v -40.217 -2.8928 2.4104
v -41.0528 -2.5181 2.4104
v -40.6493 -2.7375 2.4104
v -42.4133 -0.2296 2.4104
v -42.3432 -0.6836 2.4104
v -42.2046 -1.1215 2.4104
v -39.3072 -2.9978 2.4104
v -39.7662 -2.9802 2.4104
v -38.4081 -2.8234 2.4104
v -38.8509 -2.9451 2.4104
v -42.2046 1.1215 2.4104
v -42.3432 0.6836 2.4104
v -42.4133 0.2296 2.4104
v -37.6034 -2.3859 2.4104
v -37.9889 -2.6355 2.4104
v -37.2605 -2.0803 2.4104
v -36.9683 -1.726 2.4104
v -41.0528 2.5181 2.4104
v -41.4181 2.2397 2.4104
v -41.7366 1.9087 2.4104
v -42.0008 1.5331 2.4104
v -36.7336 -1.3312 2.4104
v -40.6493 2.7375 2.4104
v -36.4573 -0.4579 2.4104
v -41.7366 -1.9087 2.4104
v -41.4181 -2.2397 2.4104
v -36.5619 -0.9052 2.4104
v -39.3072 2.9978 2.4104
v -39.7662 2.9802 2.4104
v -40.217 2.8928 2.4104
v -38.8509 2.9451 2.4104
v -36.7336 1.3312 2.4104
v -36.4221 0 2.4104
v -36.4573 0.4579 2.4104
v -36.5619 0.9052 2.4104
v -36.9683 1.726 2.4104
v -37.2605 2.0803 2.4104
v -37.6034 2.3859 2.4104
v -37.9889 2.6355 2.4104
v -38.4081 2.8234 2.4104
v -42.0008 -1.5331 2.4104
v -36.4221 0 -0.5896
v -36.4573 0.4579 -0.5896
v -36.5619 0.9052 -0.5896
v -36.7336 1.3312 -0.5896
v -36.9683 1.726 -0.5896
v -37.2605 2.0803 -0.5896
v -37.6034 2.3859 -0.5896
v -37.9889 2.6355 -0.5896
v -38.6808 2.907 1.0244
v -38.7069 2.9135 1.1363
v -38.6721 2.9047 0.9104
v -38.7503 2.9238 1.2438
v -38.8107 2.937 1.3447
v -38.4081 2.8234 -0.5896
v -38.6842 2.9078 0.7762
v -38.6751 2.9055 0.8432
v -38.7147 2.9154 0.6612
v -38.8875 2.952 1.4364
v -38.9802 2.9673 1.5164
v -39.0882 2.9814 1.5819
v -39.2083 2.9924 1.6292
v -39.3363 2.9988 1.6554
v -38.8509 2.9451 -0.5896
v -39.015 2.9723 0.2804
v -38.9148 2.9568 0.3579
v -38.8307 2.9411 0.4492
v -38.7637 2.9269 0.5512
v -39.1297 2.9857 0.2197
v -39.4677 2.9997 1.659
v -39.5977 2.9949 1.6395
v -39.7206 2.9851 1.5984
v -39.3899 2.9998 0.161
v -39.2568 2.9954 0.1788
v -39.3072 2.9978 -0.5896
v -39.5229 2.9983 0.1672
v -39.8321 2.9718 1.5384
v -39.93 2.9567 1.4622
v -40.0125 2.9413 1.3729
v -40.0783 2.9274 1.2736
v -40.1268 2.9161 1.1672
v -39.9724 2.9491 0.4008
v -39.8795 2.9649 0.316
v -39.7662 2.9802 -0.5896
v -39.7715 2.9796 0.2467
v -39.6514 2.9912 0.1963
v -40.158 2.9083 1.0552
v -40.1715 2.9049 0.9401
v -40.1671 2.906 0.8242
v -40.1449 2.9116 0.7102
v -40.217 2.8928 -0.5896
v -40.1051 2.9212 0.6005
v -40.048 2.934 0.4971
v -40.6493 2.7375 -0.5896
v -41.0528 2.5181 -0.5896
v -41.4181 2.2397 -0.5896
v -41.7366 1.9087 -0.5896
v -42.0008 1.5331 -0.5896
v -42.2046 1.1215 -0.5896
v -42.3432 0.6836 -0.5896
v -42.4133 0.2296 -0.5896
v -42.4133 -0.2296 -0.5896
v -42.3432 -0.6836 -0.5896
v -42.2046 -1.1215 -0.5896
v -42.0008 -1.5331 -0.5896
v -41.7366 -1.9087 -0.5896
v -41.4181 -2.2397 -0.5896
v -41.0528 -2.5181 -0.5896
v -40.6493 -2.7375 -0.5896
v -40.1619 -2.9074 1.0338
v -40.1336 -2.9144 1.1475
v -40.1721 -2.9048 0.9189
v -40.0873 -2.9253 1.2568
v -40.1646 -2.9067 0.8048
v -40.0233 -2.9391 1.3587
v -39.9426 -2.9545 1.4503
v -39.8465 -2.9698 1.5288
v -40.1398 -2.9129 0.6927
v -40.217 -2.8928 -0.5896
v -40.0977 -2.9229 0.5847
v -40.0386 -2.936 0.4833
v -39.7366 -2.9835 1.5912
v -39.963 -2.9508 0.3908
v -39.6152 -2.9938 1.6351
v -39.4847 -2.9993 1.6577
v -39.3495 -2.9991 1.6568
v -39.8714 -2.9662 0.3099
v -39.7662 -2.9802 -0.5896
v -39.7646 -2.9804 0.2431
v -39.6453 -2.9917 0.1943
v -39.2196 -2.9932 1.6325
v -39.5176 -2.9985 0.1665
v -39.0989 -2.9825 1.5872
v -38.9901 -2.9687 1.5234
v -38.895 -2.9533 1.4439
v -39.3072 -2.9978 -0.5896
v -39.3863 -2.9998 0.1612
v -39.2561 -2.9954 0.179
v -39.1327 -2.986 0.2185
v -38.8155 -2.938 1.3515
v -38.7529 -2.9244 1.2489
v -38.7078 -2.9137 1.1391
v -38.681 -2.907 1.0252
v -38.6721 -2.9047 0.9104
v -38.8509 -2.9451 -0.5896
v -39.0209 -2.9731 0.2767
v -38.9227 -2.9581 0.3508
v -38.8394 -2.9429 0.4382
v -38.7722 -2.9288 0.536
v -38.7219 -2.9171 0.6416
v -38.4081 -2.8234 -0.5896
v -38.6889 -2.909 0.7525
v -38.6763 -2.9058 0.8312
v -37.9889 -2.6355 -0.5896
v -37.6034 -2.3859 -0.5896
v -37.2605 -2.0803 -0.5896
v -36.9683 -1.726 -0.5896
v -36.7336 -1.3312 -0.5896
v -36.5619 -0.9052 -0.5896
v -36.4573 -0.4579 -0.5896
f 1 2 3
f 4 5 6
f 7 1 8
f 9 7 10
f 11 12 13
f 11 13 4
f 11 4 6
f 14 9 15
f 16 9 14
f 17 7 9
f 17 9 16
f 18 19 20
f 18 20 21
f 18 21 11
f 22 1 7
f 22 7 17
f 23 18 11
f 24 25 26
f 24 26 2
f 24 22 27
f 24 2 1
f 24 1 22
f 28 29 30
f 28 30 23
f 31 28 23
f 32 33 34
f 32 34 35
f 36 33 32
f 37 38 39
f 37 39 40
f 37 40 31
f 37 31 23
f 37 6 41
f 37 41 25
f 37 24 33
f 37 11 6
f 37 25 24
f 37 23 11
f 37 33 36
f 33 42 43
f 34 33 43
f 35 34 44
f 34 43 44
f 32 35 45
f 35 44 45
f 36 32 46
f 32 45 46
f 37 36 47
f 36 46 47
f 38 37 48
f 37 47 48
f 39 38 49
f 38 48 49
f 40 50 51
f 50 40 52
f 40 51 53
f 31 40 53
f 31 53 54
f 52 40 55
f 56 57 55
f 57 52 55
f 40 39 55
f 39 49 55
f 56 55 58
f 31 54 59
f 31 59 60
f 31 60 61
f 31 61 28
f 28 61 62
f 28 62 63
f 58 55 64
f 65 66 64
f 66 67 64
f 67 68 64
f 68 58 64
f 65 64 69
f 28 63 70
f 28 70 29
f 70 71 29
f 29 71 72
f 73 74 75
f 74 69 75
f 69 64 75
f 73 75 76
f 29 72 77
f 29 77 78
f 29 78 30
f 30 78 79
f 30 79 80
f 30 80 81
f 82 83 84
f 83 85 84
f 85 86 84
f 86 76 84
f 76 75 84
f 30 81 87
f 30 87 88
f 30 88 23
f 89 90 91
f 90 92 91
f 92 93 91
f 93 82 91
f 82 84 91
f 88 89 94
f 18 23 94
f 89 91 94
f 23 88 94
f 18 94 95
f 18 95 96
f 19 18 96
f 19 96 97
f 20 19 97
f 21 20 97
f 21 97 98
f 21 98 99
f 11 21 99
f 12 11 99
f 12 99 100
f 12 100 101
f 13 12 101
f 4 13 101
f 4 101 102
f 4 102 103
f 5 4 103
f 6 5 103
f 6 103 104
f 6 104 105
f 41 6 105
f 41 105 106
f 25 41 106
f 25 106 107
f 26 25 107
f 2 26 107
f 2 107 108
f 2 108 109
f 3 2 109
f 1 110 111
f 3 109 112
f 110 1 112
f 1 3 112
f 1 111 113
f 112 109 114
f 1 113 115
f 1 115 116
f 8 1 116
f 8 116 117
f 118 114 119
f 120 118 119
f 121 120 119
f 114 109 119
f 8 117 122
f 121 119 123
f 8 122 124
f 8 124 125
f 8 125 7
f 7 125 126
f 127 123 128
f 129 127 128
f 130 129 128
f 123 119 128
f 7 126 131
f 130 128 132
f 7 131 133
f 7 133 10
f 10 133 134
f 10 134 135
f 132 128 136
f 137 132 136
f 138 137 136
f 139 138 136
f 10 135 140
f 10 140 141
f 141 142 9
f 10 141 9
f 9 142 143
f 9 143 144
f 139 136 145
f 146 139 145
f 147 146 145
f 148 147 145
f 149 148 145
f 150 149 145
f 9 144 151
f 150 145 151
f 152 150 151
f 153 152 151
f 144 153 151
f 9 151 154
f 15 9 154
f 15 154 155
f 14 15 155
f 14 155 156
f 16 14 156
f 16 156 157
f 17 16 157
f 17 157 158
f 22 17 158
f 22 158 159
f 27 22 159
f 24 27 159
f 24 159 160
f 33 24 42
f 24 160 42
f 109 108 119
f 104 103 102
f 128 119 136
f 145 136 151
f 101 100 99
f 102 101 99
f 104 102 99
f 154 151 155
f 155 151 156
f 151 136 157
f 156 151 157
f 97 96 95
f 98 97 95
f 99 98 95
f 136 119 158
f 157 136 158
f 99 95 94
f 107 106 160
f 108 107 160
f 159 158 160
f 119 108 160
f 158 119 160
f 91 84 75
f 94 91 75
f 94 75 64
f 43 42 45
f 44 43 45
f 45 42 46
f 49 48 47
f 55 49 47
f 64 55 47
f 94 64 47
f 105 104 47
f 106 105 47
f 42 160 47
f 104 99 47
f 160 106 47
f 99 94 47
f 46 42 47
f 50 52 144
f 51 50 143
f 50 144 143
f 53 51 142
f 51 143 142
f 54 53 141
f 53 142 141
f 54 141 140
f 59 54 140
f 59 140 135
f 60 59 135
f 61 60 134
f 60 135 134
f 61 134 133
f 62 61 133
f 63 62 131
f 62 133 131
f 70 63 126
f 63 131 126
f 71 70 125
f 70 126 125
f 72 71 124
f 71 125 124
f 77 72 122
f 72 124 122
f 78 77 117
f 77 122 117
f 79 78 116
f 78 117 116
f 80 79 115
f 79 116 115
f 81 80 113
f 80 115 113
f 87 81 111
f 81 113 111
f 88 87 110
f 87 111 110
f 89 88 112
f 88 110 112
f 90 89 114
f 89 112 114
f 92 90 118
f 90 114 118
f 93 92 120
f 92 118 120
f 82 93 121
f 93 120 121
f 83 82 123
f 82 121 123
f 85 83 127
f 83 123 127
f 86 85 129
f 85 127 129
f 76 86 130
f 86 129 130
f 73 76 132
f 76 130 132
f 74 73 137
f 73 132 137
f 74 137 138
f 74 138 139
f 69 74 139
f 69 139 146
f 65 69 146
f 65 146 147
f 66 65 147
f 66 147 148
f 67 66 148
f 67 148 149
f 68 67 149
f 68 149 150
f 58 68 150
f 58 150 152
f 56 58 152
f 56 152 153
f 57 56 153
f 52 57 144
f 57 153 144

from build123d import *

# Parameters (mm, degrees)
F2_R     = 3
F3_DEPTH = 3
F4_R     = 0.75
F5_DEPTH = 3.31


# Not quite as in the source:
# - a feature names something its author has since deleted; it is built from what else it names
# - the program builds the solid bodies; features that only make, move or delete a surface that nothing else refers to are left out


with BuildPart() as f3:
    # F2 (on Top) → F3 (new body)
    with BuildSketch(Plane.XY):
        with Locations((-39.4553284803, 0)):
            Circle(F2_R)
    extrude(amount=F3_DEPTH)

    # F4 (on Front) → F5 (cut, symmetric)
    with BuildSketch(Plane.XZ):
        with Locations((-39.4553284803, 1.5)):
            Circle(F4_R)
    extrude(amount=F5_DEPTH, both=True, mode=Mode.SUBTRACT)


with BuildPart() as f3_1:
    # F8: moved
    add(f3.part.moved(Location((0.033225133, 0, -0.5896431374))))


solid = f3_1.part
